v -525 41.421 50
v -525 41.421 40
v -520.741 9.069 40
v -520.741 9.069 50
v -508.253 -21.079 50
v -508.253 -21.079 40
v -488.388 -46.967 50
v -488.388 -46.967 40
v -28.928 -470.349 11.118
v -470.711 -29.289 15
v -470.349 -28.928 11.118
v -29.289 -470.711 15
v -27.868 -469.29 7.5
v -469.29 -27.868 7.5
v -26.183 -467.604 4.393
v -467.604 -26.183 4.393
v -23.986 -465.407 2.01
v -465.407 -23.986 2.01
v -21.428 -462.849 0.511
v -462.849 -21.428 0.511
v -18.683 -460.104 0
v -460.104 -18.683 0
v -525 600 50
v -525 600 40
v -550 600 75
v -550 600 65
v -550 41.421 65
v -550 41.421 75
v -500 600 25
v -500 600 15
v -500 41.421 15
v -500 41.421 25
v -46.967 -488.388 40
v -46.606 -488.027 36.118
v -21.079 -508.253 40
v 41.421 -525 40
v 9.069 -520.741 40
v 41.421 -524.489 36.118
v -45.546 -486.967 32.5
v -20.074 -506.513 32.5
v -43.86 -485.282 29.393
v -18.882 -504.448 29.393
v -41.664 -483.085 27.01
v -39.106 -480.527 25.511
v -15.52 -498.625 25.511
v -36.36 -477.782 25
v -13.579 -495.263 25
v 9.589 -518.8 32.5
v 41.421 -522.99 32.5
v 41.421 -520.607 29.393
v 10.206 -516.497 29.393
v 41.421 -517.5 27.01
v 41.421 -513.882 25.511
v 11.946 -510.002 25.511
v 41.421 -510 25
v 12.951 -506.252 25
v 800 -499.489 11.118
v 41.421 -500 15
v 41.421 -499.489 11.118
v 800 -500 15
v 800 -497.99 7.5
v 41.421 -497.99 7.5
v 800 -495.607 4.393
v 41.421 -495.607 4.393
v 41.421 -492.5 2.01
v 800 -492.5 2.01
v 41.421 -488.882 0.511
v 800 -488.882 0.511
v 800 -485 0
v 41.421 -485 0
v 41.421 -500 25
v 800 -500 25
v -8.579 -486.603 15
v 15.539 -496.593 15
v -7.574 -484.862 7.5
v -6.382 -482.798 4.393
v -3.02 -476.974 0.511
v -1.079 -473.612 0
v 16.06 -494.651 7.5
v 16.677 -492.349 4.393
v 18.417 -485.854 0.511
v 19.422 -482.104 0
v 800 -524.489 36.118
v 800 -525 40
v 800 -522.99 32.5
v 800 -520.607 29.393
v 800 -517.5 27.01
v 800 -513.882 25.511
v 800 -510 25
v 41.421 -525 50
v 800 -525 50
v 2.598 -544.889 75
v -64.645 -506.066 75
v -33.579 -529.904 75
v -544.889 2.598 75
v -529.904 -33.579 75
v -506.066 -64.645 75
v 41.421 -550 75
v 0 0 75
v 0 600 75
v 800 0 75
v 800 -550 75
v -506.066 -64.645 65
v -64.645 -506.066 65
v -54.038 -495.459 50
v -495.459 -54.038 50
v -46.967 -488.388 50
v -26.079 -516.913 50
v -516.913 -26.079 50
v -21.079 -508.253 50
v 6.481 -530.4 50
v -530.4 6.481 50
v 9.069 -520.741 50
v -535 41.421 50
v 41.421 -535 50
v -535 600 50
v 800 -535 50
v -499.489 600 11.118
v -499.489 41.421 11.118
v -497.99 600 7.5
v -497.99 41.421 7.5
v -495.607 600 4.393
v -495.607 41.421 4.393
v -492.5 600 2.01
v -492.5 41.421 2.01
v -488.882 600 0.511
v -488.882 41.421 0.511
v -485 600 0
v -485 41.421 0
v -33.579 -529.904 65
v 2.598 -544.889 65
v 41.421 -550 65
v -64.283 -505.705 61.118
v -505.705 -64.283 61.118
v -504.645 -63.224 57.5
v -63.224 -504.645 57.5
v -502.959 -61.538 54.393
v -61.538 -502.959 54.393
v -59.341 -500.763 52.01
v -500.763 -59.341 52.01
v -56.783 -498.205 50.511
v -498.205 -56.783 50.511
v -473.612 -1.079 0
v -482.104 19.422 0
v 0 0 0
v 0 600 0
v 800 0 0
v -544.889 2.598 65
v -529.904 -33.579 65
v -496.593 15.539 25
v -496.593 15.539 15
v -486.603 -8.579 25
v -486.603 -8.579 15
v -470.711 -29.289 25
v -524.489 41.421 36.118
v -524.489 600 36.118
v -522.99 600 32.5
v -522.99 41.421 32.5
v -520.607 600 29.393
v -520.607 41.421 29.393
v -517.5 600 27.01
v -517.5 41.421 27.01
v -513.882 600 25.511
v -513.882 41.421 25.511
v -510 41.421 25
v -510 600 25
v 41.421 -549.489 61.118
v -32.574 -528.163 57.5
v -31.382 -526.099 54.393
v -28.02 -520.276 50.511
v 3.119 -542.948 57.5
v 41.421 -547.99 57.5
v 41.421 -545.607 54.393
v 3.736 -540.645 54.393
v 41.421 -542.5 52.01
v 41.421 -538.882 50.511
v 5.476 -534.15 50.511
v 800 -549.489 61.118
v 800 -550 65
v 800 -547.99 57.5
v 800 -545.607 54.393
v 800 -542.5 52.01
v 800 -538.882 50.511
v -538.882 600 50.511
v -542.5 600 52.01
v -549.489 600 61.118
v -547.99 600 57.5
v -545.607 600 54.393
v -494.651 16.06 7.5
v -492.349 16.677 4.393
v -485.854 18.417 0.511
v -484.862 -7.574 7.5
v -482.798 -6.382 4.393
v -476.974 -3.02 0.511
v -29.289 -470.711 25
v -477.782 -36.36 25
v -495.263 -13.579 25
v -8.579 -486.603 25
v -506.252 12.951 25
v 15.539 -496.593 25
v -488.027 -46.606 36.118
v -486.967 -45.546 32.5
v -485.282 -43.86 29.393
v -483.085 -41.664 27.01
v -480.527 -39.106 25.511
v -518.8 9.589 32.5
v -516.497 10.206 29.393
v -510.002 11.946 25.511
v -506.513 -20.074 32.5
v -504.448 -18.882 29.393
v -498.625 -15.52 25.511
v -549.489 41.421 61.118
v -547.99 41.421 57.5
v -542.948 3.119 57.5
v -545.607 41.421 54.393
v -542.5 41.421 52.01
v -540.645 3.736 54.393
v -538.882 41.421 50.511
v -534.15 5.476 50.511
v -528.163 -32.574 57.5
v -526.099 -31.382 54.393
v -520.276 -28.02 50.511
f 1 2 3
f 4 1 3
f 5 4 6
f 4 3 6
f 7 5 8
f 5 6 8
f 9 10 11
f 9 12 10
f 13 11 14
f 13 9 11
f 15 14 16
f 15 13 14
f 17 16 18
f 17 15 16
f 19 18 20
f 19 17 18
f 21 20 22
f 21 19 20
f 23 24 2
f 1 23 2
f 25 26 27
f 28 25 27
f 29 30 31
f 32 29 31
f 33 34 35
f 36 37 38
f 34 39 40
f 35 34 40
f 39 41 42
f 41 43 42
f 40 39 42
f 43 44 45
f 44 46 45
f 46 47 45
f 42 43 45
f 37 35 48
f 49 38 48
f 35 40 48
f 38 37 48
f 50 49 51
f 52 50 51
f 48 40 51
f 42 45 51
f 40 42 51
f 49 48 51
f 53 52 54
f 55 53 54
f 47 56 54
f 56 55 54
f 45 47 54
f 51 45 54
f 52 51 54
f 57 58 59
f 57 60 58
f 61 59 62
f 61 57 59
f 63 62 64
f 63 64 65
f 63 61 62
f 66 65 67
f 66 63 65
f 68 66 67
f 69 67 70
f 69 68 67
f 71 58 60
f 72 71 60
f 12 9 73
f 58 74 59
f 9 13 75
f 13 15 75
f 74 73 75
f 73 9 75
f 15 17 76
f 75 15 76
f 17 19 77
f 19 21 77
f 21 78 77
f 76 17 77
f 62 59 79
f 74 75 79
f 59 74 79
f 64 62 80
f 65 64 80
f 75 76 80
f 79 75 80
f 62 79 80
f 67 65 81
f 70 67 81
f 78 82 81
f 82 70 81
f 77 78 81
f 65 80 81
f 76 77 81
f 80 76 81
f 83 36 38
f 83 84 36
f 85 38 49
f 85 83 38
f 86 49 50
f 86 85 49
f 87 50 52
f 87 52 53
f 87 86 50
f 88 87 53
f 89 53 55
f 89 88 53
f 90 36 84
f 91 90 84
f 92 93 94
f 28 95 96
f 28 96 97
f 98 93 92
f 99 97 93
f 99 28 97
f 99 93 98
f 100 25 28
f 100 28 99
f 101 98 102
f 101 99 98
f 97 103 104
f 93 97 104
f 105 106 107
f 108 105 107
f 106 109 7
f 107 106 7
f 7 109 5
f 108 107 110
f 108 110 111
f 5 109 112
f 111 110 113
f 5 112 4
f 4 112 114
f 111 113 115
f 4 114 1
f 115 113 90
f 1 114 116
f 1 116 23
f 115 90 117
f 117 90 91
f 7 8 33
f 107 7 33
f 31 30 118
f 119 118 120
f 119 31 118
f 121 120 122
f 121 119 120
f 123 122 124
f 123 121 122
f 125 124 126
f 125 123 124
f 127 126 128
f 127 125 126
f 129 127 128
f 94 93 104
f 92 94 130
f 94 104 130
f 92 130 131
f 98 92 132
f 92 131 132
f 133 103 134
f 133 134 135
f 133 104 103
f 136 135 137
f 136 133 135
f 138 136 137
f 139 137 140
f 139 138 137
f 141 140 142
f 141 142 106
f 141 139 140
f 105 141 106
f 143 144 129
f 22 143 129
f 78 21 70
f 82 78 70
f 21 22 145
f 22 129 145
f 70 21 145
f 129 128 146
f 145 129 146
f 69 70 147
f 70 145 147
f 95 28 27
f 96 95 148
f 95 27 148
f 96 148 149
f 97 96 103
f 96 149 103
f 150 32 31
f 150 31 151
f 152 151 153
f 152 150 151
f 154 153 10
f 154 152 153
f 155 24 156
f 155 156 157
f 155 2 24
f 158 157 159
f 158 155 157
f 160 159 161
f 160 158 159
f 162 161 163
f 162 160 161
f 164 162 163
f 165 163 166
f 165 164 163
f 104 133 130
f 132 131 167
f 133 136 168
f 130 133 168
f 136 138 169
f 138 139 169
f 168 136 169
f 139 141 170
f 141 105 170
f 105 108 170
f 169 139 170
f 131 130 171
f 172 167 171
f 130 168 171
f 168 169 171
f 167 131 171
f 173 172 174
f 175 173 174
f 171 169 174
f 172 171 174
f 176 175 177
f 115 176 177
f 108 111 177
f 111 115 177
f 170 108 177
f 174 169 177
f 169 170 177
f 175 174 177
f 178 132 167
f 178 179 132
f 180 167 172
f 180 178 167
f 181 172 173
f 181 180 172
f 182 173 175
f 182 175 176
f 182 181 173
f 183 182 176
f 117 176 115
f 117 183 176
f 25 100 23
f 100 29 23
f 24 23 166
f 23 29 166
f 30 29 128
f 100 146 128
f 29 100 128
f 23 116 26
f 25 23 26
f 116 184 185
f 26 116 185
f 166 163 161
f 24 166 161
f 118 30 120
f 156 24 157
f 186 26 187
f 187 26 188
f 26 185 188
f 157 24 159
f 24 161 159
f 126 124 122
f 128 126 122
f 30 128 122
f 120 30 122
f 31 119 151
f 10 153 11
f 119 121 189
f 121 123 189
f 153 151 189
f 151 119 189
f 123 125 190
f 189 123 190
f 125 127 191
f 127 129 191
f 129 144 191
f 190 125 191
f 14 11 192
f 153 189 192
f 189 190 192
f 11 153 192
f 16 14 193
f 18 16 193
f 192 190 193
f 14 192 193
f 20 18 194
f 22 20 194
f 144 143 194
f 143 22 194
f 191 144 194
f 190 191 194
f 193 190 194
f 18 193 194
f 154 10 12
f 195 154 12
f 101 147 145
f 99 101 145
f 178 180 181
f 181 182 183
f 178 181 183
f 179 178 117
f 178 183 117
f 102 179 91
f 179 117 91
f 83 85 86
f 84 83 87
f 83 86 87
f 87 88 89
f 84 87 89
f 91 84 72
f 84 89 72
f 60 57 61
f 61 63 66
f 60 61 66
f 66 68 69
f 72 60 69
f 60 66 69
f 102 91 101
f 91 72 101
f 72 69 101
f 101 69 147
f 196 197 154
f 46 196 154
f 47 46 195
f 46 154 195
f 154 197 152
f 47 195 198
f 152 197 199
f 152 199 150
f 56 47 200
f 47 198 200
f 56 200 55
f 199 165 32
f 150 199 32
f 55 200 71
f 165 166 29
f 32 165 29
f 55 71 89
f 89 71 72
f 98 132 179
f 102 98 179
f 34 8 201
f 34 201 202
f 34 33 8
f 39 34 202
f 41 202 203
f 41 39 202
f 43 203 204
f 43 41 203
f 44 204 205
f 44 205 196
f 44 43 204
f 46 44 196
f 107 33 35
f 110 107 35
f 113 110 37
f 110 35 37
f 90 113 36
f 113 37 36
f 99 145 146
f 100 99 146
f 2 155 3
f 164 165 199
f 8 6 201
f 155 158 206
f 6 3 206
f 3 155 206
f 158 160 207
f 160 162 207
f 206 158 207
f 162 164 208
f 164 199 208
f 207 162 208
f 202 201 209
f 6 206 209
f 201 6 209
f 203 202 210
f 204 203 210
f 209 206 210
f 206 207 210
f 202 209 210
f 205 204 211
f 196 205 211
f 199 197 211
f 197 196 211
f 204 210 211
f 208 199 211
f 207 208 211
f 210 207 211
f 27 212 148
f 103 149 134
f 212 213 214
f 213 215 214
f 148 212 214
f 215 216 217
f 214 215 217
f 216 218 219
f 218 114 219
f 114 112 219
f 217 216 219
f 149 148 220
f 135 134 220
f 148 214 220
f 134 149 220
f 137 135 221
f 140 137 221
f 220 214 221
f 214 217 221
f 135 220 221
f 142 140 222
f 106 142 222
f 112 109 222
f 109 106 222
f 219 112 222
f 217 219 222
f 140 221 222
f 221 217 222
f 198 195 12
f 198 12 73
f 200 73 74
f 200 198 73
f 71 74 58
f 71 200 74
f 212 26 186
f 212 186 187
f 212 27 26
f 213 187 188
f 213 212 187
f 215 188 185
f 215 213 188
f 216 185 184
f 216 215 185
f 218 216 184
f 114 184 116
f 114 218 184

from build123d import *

# Parameters (mm, degrees)
F1_DEPTH = 25
F2_R     = 100
F4_DEPTH = 25
F6_DEPTH = 25
F8_DEPTH = 539
F9_R     = 15


with BuildPart() as f1:
    # F0 (on Top) → F1 (new body)
    with BuildSketch(Plane.XY):
        Polygon((0, 0), (0, 600), (-500, 600), (-500, 0), (0, -500), (800, -500), (800, 0), align=None)
    extrude(amount=F1_DEPTH)

    # F2
    f2_edges = [f1.edges().sort_by_distance(p)[0] for p in [
        (-500, 0, 12.5),
        (0, -500, 12.5),
    ]]
    fillet(f2_edges, radius=F2_R)

    # F3 (on face) → F4 (join)
    with BuildSketch(Plane.XY.offset(25)):
        with BuildLine():
            Line((-525, 625), (-525, 41.4213562373))
            ThreePointArc((-525, 41.4213562373), (-515.4849415639, -6.4140728083), (-488.3883476483, -46.966991411))
            Line((-488.3883476483, -46.966991411), (-46.966991411, -488.3883476483))
            ThreePointArc((-46.966991411, -488.3883476483), (-6.4140728083, -515.4849415639), (41.4213562373, -525))
            Line((41.4213562373, -525), (825, -525))
            Line((825, -525), (825, 25))
            Line((825, 25), (25, 25))
            Line((25, 25), (25, 625))
            Line((25, 625), (-525, 625))
        make_face()
    extrude(amount=F4_DEPTH)

    # F5 (on face) → F6 (join)
    with BuildSketch(Plane.XY.offset(50)):
        with BuildLine():
            Line((-550, 650), (-550, 41.4213562373))
            ThreePointArc((-550, 41.4213562373), (-538.5819298767, -15.9811586175), (-506.066017178, -64.6446609407))
            Line((-506.066017178, -64.6446609407), (-64.6446609407, -506.066017178))
            ThreePointArc((-64.6446609407, -506.066017178), (-15.9811586175, -538.5819298767), (41.4213562373, -550))
            Line((41.4213562373, -550), (850, -550))
            Line((850, -550), (850, 50))
            Line((850, 50), (50, 50))
            Line((50, 50), (50, 650))
            Line((50, 650), (-550, 650))
        make_face()
    extrude(amount=F6_DEPTH)

    # F7 (on face) → F8 (cut)
    with BuildSketch(Plane(origin=(0, 0, 0), x_dir=(1, 0, 0), z_dir=(0, 0, -1))):
        Polygon((800, 759.8769068718), (800, 0), (0, 0), (0, -600), (-650.8337855339, -600), (-650.8337855339, -840.3587818146), (869.2708611488, -840.3587818146), (869.2708611488, 0), (869.2708611488, 759.8769068718), align=None)
    extrude(amount=-F8_DEPTH, mode=Mode.SUBTRACT)

    # F9
    f9_edges = [f1.edges().sort_by_distance(p)[0] for p in [
        (420.710678, -500, 0),
        (420.710678, -525, 25),
        (420.710678, -550, 50),
        (3.153013, -492.387953, 0),
        (-6.414073, -515.484942, 25),
        (-15.981159, -538.58193, 50),
        (-250, -250, 0),
        (-267.67767, -267.67767, 25),
        (-285.355339, -285.355339, 50),
        (-492.387953, 3.153013, 0),
        (-515.484942, -6.414073, 25),
        (-538.58193, -15.981159, 50),
        (-500, 320.710678, 0),
        (-525, 320.710678, 25),
        (-550, 320.710678, 50),
    ]]
    fillet(f9_edges, radius=F9_R)


solid = f1.part
